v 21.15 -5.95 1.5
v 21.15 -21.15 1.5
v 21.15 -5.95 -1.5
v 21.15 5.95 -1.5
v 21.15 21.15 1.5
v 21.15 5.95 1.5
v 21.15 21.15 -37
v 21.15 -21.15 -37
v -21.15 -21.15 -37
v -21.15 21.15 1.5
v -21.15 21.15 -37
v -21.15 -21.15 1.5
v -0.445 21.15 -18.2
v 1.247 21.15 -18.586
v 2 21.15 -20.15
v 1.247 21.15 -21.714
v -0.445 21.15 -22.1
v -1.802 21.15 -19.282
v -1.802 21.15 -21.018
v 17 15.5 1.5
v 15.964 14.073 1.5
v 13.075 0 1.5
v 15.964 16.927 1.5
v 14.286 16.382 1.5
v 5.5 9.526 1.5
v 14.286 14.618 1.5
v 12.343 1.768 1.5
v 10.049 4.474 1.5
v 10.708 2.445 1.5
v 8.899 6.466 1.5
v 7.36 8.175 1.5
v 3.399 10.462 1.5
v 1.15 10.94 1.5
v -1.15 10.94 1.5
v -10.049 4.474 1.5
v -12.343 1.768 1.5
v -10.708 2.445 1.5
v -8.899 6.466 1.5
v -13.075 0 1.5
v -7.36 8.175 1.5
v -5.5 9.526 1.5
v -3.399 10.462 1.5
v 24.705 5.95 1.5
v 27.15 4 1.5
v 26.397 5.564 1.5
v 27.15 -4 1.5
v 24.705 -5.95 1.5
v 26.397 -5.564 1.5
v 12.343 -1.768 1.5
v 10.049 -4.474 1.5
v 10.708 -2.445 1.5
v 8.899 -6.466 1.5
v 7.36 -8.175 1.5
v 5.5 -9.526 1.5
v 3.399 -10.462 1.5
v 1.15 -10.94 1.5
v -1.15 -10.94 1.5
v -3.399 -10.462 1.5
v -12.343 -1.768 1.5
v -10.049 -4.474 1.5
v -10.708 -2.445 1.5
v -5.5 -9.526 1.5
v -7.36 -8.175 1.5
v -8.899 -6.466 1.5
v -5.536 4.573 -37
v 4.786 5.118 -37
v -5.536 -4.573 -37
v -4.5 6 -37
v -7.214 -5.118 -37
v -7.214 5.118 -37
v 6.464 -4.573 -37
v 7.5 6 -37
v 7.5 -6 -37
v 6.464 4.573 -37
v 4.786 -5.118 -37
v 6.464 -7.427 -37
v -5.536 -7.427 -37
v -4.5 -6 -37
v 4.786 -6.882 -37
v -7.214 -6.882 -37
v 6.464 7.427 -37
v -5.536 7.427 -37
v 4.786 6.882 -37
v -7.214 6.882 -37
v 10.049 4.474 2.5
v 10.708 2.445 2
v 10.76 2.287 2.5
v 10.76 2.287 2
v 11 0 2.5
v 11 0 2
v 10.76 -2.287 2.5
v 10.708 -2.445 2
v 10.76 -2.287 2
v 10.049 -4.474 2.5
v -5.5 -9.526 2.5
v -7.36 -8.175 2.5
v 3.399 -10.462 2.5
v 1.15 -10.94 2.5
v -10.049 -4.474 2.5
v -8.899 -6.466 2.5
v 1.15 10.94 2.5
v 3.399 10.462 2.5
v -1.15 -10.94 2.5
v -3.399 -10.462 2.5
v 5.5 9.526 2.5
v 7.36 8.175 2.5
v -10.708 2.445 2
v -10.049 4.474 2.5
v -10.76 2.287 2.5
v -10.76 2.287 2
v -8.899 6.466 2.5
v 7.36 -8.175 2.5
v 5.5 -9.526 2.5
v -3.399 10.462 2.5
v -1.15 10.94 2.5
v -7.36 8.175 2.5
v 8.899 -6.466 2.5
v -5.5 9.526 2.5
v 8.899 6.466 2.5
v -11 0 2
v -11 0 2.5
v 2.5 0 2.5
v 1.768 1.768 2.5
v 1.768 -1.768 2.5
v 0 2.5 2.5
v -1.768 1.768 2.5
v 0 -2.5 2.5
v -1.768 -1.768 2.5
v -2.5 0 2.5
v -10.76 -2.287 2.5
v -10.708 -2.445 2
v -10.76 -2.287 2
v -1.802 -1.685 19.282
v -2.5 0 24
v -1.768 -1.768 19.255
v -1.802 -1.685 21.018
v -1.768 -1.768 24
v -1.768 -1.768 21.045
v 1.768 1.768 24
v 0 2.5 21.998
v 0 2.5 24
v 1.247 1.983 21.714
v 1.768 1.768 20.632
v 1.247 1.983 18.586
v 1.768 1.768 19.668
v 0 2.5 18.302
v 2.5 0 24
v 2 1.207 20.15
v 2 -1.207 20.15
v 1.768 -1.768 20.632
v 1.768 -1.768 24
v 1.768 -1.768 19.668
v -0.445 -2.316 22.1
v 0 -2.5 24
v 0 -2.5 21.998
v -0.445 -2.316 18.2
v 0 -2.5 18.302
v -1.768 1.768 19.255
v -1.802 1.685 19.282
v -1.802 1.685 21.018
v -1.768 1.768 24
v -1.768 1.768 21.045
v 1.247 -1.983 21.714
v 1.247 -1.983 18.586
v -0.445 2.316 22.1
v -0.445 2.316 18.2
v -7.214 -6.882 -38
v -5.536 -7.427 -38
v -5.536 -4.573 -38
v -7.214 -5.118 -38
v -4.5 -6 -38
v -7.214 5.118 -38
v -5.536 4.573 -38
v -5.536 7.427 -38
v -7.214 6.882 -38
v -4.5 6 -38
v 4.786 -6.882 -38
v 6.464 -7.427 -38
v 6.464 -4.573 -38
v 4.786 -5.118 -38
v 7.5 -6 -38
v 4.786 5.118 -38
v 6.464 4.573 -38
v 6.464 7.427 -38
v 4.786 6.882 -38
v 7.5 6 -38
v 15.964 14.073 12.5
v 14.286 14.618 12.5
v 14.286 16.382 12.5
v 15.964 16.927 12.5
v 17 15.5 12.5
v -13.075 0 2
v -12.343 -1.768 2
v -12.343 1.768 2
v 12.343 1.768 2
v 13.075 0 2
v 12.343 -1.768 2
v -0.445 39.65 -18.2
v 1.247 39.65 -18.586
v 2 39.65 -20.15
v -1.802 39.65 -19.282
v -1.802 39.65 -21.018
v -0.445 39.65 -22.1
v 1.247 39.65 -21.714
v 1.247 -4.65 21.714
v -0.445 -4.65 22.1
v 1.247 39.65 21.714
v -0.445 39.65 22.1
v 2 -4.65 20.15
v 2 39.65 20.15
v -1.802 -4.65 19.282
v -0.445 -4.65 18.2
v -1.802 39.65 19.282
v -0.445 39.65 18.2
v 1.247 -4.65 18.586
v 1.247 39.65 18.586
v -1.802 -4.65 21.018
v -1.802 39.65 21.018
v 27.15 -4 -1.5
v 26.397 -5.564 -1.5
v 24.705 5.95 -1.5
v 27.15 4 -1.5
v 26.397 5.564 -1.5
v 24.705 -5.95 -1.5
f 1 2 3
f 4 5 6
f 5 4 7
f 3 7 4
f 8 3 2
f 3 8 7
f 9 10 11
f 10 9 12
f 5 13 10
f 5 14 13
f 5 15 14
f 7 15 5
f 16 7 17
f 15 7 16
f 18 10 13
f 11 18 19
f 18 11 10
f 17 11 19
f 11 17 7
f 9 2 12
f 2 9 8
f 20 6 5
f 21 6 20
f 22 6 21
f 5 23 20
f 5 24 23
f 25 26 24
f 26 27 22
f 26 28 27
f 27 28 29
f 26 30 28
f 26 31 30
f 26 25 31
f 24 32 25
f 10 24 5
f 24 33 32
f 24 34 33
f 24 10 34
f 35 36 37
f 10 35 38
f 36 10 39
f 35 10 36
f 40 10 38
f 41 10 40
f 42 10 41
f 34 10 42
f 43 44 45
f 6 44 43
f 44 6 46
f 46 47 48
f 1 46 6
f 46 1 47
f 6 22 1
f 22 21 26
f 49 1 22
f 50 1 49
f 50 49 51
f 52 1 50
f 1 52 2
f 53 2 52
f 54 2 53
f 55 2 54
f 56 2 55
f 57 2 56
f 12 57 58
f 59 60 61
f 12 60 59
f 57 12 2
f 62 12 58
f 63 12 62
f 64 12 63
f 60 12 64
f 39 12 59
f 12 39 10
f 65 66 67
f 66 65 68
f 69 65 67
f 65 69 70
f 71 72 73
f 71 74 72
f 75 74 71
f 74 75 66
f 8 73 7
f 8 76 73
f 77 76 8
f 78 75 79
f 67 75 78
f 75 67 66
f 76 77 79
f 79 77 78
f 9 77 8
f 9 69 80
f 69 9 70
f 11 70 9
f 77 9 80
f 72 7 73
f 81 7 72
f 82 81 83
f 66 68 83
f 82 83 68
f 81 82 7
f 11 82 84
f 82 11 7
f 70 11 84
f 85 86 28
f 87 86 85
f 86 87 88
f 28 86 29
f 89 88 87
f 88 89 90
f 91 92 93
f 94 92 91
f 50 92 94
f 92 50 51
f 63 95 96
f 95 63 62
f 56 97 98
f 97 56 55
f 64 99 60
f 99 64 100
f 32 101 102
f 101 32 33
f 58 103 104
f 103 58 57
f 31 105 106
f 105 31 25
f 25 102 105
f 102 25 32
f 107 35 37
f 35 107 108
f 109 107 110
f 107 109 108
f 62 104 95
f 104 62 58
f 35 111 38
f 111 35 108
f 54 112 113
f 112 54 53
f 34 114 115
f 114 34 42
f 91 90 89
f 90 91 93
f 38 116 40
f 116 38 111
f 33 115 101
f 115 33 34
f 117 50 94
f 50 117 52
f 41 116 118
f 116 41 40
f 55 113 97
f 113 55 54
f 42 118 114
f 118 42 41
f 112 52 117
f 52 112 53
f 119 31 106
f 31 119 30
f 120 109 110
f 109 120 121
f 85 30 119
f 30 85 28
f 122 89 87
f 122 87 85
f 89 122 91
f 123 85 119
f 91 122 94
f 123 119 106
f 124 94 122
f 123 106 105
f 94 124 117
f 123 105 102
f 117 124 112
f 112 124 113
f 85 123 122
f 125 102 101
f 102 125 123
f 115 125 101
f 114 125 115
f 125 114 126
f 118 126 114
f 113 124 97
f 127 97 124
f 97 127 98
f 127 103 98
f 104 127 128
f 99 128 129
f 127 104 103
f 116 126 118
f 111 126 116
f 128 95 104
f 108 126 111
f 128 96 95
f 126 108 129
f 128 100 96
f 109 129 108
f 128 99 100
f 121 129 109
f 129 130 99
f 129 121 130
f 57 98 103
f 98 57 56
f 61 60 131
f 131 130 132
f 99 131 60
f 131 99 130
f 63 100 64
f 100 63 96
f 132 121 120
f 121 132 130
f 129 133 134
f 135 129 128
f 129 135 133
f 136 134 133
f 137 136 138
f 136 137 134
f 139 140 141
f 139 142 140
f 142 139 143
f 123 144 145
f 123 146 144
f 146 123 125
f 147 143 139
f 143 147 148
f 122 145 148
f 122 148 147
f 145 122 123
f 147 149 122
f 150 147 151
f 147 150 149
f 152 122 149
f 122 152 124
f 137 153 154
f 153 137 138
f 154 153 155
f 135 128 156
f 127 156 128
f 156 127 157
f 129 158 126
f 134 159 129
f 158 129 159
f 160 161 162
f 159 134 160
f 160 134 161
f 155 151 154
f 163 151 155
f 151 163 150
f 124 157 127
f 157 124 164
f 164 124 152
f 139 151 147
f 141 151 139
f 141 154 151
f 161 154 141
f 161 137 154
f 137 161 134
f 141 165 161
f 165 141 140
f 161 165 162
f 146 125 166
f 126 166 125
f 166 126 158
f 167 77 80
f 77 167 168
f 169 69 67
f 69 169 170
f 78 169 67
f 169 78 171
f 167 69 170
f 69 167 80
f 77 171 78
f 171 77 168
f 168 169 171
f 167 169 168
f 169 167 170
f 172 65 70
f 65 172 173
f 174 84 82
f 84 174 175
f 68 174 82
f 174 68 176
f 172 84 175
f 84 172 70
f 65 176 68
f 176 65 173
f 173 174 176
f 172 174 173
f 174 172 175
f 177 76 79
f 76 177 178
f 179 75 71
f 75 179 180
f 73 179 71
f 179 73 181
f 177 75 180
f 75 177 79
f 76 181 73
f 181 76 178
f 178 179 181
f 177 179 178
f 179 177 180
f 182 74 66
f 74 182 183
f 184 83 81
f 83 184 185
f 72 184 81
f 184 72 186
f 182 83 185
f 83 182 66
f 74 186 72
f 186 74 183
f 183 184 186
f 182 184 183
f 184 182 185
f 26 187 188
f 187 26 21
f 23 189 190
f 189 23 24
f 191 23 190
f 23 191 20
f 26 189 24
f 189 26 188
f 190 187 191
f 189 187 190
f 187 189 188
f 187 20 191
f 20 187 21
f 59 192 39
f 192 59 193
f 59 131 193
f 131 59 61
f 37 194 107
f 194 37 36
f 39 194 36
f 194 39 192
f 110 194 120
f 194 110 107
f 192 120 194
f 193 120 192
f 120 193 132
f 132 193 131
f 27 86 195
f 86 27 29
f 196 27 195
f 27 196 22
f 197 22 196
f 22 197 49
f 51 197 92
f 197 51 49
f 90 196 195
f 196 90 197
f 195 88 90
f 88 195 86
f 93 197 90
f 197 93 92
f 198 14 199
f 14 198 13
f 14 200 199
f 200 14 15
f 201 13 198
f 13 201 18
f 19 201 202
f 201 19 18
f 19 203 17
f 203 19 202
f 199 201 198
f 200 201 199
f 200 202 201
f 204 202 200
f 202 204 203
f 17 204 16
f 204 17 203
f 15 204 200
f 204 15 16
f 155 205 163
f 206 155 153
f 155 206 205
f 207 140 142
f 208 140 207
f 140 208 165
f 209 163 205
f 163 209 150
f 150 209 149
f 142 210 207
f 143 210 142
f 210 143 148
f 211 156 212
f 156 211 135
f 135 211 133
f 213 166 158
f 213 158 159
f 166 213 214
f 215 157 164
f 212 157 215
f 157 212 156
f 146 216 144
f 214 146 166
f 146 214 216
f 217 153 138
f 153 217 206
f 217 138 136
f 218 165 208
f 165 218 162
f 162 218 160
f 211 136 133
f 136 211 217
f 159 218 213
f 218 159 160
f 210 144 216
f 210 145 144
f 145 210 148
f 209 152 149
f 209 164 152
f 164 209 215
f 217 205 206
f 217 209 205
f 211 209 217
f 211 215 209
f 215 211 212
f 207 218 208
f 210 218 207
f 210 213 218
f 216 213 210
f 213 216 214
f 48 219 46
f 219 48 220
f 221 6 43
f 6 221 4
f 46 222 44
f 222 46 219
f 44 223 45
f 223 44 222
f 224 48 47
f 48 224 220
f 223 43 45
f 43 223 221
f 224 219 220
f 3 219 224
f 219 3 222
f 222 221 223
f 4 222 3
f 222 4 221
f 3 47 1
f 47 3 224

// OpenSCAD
// Parameters
face_width_mm = 42.3; //[21.15:84.6:0.1]
front_face_thickness_mm = 3.0; //[1.5:6.0:0.1]
body_length_mm = 34.0; //[17.0:68.0:0.1]
body_width_mm = 42.3; //[21.15:84.6:0.1]
body_height_mm = 42.3; //[21.15:84.6:0.1]
rear_cap_thickness_mm = 2.5; //[1.25:5.0:0.1]
shaft_diameter_mm = 5.0; //[2.5:10.0:0.1]
shaft_length_out_mm = 20.0; //[10.0:40.0:0.1]
shaft_boss_diameter_mm = 22.0; //[11.0:44.0:0.1]
shaft_boss_height_mm = 2.0; //[1.0:4.0:0.1]
mounting_hole_spacing_mm = 31.0; //[15.5:62.0:0.1]
mounting_hole_diameter_mm = 3.5; //[1.75:7.0:0.1]
overlap_mm = 1.0; //[0.5:2.0:0.1]
d_plug_length_mm = 18.0; //[9.0:36.0:0.1]
d_plug_width_mm = 12.0; //[6.0:24.0:0.1]
d_plug_rad_mm = 2.0; //[1.0:4.0:0.1]
grill_hole_diameter_mm = 3.0; //[1.5:6.0:0.1]
grill_hole_pitch_mm = 6.0; //[3.0:12.0:0.1]
screw_shank_diameter_mm = 3.0; //[1.5:6.0:0.1]
screw_length_mm = 12.0; //[6.0:24.0:0.1]
washer_outer_diameter_mm = 7.0; //[3.5:14.0:0.1]
washer_thickness_mm = 1.0; //[0.5:2.0:0.1]
ttrack_hole_diameter_mm = 5.0; //[2.5:10.0:0.1]
rail_hole_diameter_mm = 4.0; //[2.0:8.0:0.1]

// D Plug D
module d_plug_D() {
  color("DimGray") {
    hull() {
      translate([(face_width_mm/2 - d_plug_rad_mm - overlap_mm) + (d_plug_length_mm/2 - d_plug_rad_mm), 0, 0])
        cylinder(r=d_plug_rad_mm, h=front_face_thickness_mm, center=true);
      translate([(face_width_mm/2 - d_plug_rad_mm - overlap_mm) - (d_plug_length_mm/2 - d_plug_rad_mm), 0, 0])
        cylinder(r=d_plug_rad_mm, h=front_face_thickness_mm, center=true);
      translate([(face_width_mm/2 - d_plug_rad_mm - overlap_mm) + (d_plug_length_mm/2 - d_plug_rad_mm), (d_plug_width_mm/2 - d_plug_rad_mm), 0])
        cylinder(r=d_plug_rad_mm, h=front_face_thickness_mm, center=true);
      translate([(face_width_mm/2 - d_plug_rad_mm - overlap_mm) - (d_plug_length_mm/2 - d_plug_rad_mm), (d_plug_width_mm/2 - d_plug_rad_mm), 0])
        cylinder(r=d_plug_rad_mm, h=front_face_thickness_mm, center=true);
      translate([(face_width_mm/2 - d_plug_rad_mm - overlap_mm) + (d_plug_length_mm/2 - d_plug_rad_mm), -(d_plug_width_mm/2 - d_plug_rad_mm), 0])
        cylinder(r=d_plug_rad_mm, h=front_face_thickness_mm, center=true);
      translate([(face_width_mm/2 - d_plug_rad_mm - overlap_mm) - (d_plug_length_mm/2 - d_plug_rad_mm), -(d_plug_width_mm/2 - d_plug_rad_mm), 0])
        cylinder(r=d_plug_rad_mm, h=front_face_thickness_mm, center=true);
    }
  }
}

// Grill Hole Positions
module grill_hole_positions() {
  color("Silver") {
    for (i = [-1, 1], j = [-1, 1]) {
      translate([i * grill_hole_pitch_mm, j * grill_hole_pitch_mm, -(front_face_thickness_mm/2 + body_length_mm - overlap_mm + rear_cap_thickness_mm/2)])
        cylinder(r=grill_hole_diameter_mm/2, h=rear_cap_thickness_mm + 2*overlap_mm, center=true);
    }
  }
}

// Screw and Washer
module screw_and_washer() {
  color("SteelBlue") {
    union() {
      translate([mounting_hole_spacing_mm/2, mounting_hole_spacing_mm/2, front_face_thickness_mm/2 + screw_length_mm/2 - overlap_mm])
        cylinder(r=screw_shank_diameter_mm/2, h=screw_length_mm, center=true);
      translate([mounting_hole_spacing_mm/2, mounting_hole_spacing_mm/2, front_face_thickness_mm/2 + washer_thickness_mm/2 - overlap_mm])
        cylinder(r=washer_outer_diameter_mm/2, h=washer_thickness_mm, center=true);
    }
  }
}

// Ttrack Hole Positions
module ttrack_hole_positions() {
  color("DarkSlateGray") {
    for (i = [-1, 1]) {
      translate([i * body_width_mm/4, 0, -(front_face_thickness_mm/2 + body_length_mm/2 - overlap_mm)])
        cylinder(r=ttrack_hole_diameter_mm/2, h=body_length_mm + front_face_thickness_mm + 2*overlap_mm, center=true);
    }
  }
}

// Rail Hole Positions
module rail_hole_positions() {
  color("DarkOliveGreen") {
    for (i = [-1, 1]) {
      rotate([90, 0, 0])
        translate([0, i * (body_height_mm/2 - overlap_mm), -(front_face_thickness_mm/2 + body_length_mm/2 - overlap_mm)])
          cylinder(r=rail_hole_diameter_mm/2, h=body_height_mm + 2*overlap_mm, center=true);
    }
  }
}

// Motor Assembly
module assembly() {
  color("Black") {
    // Motor Body
    translate([0, 0, -(front_face_thickness_mm/2 + body_length_mm/2 - overlap_mm)])
      cube([body_width_mm, body_height_mm, body_length_mm], center=true);
    // Front Face
    translate([0, 0, 0])
      cube([face_width_mm, face_width_mm, front_face_thickness_mm], center=true);
    // Rear Cap Face
    translate([0, 0, -(front_face_thickness_mm/2 + body_length_mm - overlap_mm + rear_cap_thickness_mm/2)])
      cube([body_width_mm, body_height_mm, rear_cap_thickness_mm], center=true);
    // Shaft Boss
    translate([0, 0, front_face_thickness_mm/2 + shaft_boss_height_mm/2 - overlap_mm])
      cylinder(r=shaft_boss_diameter_mm/2, h=shaft_boss_height_mm, center=true);
    // Shaft
    translate([0, 0, front_face_thickness_mm/2 + shaft_boss_height_mm/2 + shaft_length_out_mm/2 - overlap_mm])
      cylinder(r=shaft_diameter_mm/2, h=shaft_length_out_mm + shaft_boss_height_mm + front_face_thickness_mm, center=true);
  }
  // D Plug D
  d_plug_D();
  // Grill Hole Positions
  grill_hole_positions();
  // Screw and Washer
  screw_and_washer();
  // Ttrack Hole Positions
  ttrack_hole_positions();
  // Rail Hole Positions
  rail_hole_positions();
}

assembly();
